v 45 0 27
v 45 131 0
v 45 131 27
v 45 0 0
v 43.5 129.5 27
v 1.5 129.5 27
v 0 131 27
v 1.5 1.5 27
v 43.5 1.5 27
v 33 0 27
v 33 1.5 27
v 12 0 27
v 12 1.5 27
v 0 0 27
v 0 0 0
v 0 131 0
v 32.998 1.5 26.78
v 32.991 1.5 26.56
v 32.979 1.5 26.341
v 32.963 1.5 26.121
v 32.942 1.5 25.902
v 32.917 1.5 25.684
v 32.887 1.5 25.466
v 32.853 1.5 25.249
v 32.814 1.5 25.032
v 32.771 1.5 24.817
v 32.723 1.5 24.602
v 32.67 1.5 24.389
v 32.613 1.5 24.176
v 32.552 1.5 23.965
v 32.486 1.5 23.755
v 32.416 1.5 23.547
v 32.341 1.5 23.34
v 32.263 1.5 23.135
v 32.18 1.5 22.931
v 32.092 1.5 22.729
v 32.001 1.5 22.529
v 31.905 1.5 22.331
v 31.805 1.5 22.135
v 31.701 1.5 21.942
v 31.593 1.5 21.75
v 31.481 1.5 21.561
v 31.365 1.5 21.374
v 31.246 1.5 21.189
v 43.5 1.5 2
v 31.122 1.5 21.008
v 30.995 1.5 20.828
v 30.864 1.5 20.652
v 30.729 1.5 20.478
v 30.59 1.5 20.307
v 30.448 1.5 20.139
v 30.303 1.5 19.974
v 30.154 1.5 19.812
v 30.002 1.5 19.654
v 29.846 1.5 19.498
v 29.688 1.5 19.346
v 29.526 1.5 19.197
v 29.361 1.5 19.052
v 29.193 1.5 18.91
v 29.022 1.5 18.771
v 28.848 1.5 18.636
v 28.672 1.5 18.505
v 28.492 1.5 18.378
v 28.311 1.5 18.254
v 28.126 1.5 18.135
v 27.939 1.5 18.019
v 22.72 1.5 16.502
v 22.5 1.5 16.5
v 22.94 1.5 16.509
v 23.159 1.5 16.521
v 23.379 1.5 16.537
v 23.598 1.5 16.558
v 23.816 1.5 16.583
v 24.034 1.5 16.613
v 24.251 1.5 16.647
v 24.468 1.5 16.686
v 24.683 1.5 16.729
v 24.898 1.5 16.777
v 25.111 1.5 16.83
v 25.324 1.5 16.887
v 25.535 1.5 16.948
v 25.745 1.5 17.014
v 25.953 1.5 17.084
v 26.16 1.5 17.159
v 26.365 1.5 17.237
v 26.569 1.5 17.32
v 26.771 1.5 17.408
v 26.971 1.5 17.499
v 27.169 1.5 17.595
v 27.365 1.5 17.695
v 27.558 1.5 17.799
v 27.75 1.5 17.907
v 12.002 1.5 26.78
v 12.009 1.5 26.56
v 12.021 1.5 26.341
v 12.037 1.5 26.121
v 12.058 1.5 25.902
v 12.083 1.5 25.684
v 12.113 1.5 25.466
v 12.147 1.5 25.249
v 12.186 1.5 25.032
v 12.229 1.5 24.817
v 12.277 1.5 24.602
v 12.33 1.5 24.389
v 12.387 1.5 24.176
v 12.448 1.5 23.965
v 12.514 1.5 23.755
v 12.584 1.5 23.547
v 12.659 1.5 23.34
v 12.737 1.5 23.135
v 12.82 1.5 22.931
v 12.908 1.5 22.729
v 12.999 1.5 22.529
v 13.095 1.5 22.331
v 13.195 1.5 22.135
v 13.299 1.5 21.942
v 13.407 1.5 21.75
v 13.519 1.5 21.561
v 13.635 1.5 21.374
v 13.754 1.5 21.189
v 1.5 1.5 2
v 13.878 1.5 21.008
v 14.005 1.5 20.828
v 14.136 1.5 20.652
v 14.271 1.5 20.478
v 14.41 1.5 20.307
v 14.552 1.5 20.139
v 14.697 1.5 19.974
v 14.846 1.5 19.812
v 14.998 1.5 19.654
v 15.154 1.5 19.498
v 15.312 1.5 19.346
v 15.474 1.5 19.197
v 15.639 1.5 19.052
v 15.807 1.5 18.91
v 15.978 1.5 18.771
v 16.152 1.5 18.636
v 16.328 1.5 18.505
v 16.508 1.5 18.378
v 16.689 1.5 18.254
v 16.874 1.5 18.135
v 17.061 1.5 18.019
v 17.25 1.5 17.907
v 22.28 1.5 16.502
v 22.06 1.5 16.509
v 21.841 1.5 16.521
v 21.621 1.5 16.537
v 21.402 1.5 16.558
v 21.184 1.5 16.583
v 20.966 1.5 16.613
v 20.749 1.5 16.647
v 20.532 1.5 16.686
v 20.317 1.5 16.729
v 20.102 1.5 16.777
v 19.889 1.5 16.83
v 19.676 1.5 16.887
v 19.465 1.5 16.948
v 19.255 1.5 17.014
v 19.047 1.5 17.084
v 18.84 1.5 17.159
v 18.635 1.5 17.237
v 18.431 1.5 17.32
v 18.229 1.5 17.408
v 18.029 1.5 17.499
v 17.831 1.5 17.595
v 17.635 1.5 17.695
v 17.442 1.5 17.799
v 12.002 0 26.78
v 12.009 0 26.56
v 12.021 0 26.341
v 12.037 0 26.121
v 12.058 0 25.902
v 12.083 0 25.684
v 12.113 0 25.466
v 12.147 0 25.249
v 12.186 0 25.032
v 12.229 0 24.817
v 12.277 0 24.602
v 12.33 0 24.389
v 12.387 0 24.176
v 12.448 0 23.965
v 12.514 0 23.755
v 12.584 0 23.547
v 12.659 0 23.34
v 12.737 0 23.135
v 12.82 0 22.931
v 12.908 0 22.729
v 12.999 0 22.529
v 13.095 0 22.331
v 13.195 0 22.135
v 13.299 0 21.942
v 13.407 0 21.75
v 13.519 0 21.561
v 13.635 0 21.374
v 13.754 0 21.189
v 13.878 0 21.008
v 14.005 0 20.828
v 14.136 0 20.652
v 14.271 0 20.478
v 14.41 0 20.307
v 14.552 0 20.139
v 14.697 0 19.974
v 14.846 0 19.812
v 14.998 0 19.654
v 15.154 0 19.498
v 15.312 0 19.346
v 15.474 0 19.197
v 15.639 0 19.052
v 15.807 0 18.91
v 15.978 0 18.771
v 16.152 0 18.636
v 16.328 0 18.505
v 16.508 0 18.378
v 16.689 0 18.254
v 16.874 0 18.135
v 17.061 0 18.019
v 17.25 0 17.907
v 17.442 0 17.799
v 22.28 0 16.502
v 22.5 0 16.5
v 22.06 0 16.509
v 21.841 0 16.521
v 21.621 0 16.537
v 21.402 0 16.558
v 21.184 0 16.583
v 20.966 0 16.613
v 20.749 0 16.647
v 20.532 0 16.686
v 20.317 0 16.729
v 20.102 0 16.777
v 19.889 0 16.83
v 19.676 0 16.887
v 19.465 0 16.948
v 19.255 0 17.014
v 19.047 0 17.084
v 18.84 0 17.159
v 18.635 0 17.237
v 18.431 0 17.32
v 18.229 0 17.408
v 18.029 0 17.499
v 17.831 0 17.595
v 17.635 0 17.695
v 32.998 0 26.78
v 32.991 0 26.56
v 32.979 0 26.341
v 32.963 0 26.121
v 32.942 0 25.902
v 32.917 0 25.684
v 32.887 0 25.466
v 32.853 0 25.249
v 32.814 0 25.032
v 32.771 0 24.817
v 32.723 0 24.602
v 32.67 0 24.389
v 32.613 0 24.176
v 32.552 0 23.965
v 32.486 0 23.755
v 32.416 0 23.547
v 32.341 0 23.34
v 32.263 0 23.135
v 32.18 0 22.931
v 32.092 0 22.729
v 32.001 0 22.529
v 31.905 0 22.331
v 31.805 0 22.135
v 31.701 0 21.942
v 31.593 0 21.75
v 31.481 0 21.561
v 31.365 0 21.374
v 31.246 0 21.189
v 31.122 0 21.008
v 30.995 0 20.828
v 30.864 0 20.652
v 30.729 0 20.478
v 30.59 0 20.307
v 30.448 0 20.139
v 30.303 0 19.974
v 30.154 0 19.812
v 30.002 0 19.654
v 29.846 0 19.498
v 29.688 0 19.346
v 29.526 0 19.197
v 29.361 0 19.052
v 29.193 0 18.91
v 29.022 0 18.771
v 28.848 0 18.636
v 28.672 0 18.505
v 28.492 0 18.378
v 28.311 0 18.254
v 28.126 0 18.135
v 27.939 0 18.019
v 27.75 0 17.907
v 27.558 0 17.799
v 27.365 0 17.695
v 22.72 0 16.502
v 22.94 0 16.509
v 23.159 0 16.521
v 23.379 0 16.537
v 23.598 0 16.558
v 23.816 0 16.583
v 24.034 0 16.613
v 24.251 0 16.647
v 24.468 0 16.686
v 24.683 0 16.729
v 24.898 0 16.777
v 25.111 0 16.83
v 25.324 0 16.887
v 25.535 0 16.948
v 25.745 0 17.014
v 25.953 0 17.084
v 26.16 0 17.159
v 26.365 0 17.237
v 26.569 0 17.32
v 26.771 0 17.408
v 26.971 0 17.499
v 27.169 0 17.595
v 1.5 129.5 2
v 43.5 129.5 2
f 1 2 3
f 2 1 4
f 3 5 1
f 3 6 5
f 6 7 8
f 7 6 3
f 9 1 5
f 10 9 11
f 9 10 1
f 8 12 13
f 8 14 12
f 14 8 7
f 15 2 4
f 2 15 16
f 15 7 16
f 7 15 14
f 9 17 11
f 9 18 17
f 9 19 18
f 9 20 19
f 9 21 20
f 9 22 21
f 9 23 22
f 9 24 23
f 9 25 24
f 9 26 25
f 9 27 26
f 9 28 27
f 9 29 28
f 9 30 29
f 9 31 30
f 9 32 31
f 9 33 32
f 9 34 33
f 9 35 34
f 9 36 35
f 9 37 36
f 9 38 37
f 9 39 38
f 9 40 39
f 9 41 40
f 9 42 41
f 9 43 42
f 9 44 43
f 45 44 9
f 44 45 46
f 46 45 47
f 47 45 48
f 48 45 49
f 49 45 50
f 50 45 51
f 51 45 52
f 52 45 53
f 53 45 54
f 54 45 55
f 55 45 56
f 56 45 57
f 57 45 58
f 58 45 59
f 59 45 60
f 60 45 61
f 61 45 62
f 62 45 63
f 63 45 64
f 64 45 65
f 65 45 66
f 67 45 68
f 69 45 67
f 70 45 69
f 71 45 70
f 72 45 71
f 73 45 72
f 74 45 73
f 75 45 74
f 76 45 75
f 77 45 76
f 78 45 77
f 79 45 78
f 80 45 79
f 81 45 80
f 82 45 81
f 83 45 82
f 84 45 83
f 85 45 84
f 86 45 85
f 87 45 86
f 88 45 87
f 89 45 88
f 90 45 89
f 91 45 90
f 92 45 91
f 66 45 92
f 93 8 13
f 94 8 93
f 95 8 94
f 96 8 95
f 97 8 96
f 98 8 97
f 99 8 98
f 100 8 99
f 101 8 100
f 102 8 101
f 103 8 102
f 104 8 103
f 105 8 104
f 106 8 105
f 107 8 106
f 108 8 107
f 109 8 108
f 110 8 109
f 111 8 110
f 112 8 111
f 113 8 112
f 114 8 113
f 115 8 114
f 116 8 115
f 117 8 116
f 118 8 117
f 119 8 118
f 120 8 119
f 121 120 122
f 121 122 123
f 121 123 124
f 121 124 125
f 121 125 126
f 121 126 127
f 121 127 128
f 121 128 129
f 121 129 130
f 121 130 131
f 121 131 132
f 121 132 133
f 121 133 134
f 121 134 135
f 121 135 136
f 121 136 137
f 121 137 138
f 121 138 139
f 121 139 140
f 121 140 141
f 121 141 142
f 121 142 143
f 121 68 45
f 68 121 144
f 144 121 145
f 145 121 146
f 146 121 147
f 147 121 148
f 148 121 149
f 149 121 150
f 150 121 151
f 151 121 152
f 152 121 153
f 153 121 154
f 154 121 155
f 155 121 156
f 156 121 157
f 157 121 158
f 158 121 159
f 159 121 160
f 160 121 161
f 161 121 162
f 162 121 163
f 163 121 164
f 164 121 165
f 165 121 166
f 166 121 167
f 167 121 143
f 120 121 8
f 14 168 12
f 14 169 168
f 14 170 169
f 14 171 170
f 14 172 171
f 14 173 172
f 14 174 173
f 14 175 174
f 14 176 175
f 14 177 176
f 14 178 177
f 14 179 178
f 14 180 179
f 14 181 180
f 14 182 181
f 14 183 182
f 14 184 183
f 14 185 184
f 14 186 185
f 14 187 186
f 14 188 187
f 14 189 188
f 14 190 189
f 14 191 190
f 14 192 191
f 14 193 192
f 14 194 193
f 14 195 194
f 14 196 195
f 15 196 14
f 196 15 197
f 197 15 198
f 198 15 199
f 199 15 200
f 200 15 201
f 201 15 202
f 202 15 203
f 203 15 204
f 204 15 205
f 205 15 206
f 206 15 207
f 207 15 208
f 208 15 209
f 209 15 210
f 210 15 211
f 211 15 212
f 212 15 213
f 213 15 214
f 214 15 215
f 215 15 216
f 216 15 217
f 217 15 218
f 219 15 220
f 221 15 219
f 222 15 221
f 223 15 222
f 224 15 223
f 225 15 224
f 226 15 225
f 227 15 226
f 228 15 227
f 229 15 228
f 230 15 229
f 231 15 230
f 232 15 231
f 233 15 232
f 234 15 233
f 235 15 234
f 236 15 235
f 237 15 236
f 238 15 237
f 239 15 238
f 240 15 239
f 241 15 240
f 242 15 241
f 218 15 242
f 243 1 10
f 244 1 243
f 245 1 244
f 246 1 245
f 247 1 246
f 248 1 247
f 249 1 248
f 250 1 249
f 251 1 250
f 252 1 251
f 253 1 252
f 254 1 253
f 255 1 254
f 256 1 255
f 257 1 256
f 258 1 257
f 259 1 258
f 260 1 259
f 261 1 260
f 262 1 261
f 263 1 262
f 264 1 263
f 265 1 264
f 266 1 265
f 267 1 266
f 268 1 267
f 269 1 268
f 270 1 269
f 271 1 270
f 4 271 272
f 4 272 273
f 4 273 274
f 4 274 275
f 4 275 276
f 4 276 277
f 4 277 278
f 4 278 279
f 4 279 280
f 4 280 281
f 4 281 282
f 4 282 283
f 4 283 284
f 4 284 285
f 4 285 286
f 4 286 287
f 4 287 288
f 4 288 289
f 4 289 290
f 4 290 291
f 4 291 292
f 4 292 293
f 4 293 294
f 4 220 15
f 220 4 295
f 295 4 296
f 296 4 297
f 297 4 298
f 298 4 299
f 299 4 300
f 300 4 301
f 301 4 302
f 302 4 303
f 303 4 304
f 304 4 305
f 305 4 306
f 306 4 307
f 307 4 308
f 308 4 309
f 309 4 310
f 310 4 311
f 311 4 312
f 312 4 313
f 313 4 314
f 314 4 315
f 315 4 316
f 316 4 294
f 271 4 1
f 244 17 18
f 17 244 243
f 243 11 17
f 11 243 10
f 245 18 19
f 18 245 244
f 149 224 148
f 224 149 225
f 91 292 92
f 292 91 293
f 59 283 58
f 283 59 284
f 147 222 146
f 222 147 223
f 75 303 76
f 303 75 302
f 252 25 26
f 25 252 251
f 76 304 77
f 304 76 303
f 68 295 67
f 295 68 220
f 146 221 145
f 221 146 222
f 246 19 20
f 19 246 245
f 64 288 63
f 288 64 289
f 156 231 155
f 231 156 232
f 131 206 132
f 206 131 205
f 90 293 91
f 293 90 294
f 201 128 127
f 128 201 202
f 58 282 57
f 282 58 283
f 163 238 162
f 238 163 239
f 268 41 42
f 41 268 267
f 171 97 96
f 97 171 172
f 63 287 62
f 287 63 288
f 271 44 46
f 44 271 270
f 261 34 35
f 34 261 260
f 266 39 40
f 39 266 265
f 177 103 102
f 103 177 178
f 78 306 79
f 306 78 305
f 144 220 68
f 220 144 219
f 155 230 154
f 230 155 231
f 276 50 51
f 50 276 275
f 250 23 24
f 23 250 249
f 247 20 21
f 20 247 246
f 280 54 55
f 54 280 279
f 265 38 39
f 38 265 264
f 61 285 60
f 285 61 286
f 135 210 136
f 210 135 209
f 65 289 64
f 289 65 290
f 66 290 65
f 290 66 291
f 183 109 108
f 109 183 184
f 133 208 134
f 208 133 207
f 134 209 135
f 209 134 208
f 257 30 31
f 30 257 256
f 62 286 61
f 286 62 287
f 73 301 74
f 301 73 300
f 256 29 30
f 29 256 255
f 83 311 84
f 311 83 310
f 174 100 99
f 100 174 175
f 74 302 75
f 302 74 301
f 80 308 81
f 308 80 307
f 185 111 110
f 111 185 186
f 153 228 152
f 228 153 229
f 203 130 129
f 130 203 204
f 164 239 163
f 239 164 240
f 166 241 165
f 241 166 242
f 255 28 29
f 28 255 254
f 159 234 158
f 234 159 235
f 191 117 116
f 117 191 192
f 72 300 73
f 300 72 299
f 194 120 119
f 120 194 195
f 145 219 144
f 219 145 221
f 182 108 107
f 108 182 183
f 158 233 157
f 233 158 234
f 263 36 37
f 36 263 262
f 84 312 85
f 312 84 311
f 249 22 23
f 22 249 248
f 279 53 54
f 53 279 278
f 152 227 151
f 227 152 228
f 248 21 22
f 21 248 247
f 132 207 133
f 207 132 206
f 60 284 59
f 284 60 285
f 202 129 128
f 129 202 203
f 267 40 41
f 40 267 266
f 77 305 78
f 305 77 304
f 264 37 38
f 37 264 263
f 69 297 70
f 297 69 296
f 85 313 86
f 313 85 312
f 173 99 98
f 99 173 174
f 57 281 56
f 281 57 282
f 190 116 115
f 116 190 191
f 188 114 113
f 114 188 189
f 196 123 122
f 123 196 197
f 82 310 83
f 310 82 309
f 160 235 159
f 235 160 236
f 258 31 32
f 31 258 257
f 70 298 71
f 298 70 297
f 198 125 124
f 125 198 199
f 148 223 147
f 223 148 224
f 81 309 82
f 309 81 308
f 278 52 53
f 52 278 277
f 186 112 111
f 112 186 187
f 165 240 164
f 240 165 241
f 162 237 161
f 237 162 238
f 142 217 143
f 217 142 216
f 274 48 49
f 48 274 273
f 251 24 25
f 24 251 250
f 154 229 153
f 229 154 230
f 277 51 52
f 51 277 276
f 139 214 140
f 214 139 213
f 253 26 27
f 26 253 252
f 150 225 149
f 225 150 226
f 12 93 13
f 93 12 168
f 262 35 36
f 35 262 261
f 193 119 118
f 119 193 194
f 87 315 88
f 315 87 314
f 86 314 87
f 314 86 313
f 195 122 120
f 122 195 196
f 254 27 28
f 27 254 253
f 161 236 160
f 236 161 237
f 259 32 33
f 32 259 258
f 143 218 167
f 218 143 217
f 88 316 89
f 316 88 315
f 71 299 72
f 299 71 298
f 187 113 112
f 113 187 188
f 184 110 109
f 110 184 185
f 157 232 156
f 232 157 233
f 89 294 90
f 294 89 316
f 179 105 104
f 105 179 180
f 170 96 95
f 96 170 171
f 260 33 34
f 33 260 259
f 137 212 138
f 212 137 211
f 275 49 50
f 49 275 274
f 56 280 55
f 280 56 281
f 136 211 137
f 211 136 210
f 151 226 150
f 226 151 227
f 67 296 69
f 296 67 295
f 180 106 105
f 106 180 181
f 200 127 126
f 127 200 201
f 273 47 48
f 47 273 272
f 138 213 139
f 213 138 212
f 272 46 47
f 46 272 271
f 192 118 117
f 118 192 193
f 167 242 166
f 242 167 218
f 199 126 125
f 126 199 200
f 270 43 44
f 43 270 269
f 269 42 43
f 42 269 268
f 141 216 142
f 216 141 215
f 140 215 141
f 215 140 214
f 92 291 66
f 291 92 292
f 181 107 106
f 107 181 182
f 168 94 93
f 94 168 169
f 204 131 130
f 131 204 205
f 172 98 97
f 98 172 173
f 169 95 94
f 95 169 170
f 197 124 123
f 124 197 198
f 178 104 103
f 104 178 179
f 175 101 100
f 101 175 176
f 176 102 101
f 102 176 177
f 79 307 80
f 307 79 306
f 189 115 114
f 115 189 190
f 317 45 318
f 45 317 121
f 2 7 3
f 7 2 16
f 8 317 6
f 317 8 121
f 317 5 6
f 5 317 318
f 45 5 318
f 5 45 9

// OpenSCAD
// Box inner dimensions
width     =  42;
length    = 128;
heigth    =  25;
wallthick =   1.5;
basethick =   2;

//resolution
$fn=300;

//base
cube([width+2*wallthick,length+2*wallthick,basethick]);

//walls
difference (){
	cube([width+2*wallthick,wallthick,heigth+basethick]);
	translate ([width/2+wallthick,-0.1,heigth+basethick])
	rotate([-90,0,0])
		cylinder(wallthick+0.2,width/4,width/4);
}
cube([wallthick,length+2*wallthick,heigth+basethick]);

translate([0,length+wallthick,0])
	cube([width+2*wallthick,wallthick,heigth+basethick]);

translate([width+wallthick,0,0])
	cube([wallthick,length+2*wallthick,heigth+basethick]);
